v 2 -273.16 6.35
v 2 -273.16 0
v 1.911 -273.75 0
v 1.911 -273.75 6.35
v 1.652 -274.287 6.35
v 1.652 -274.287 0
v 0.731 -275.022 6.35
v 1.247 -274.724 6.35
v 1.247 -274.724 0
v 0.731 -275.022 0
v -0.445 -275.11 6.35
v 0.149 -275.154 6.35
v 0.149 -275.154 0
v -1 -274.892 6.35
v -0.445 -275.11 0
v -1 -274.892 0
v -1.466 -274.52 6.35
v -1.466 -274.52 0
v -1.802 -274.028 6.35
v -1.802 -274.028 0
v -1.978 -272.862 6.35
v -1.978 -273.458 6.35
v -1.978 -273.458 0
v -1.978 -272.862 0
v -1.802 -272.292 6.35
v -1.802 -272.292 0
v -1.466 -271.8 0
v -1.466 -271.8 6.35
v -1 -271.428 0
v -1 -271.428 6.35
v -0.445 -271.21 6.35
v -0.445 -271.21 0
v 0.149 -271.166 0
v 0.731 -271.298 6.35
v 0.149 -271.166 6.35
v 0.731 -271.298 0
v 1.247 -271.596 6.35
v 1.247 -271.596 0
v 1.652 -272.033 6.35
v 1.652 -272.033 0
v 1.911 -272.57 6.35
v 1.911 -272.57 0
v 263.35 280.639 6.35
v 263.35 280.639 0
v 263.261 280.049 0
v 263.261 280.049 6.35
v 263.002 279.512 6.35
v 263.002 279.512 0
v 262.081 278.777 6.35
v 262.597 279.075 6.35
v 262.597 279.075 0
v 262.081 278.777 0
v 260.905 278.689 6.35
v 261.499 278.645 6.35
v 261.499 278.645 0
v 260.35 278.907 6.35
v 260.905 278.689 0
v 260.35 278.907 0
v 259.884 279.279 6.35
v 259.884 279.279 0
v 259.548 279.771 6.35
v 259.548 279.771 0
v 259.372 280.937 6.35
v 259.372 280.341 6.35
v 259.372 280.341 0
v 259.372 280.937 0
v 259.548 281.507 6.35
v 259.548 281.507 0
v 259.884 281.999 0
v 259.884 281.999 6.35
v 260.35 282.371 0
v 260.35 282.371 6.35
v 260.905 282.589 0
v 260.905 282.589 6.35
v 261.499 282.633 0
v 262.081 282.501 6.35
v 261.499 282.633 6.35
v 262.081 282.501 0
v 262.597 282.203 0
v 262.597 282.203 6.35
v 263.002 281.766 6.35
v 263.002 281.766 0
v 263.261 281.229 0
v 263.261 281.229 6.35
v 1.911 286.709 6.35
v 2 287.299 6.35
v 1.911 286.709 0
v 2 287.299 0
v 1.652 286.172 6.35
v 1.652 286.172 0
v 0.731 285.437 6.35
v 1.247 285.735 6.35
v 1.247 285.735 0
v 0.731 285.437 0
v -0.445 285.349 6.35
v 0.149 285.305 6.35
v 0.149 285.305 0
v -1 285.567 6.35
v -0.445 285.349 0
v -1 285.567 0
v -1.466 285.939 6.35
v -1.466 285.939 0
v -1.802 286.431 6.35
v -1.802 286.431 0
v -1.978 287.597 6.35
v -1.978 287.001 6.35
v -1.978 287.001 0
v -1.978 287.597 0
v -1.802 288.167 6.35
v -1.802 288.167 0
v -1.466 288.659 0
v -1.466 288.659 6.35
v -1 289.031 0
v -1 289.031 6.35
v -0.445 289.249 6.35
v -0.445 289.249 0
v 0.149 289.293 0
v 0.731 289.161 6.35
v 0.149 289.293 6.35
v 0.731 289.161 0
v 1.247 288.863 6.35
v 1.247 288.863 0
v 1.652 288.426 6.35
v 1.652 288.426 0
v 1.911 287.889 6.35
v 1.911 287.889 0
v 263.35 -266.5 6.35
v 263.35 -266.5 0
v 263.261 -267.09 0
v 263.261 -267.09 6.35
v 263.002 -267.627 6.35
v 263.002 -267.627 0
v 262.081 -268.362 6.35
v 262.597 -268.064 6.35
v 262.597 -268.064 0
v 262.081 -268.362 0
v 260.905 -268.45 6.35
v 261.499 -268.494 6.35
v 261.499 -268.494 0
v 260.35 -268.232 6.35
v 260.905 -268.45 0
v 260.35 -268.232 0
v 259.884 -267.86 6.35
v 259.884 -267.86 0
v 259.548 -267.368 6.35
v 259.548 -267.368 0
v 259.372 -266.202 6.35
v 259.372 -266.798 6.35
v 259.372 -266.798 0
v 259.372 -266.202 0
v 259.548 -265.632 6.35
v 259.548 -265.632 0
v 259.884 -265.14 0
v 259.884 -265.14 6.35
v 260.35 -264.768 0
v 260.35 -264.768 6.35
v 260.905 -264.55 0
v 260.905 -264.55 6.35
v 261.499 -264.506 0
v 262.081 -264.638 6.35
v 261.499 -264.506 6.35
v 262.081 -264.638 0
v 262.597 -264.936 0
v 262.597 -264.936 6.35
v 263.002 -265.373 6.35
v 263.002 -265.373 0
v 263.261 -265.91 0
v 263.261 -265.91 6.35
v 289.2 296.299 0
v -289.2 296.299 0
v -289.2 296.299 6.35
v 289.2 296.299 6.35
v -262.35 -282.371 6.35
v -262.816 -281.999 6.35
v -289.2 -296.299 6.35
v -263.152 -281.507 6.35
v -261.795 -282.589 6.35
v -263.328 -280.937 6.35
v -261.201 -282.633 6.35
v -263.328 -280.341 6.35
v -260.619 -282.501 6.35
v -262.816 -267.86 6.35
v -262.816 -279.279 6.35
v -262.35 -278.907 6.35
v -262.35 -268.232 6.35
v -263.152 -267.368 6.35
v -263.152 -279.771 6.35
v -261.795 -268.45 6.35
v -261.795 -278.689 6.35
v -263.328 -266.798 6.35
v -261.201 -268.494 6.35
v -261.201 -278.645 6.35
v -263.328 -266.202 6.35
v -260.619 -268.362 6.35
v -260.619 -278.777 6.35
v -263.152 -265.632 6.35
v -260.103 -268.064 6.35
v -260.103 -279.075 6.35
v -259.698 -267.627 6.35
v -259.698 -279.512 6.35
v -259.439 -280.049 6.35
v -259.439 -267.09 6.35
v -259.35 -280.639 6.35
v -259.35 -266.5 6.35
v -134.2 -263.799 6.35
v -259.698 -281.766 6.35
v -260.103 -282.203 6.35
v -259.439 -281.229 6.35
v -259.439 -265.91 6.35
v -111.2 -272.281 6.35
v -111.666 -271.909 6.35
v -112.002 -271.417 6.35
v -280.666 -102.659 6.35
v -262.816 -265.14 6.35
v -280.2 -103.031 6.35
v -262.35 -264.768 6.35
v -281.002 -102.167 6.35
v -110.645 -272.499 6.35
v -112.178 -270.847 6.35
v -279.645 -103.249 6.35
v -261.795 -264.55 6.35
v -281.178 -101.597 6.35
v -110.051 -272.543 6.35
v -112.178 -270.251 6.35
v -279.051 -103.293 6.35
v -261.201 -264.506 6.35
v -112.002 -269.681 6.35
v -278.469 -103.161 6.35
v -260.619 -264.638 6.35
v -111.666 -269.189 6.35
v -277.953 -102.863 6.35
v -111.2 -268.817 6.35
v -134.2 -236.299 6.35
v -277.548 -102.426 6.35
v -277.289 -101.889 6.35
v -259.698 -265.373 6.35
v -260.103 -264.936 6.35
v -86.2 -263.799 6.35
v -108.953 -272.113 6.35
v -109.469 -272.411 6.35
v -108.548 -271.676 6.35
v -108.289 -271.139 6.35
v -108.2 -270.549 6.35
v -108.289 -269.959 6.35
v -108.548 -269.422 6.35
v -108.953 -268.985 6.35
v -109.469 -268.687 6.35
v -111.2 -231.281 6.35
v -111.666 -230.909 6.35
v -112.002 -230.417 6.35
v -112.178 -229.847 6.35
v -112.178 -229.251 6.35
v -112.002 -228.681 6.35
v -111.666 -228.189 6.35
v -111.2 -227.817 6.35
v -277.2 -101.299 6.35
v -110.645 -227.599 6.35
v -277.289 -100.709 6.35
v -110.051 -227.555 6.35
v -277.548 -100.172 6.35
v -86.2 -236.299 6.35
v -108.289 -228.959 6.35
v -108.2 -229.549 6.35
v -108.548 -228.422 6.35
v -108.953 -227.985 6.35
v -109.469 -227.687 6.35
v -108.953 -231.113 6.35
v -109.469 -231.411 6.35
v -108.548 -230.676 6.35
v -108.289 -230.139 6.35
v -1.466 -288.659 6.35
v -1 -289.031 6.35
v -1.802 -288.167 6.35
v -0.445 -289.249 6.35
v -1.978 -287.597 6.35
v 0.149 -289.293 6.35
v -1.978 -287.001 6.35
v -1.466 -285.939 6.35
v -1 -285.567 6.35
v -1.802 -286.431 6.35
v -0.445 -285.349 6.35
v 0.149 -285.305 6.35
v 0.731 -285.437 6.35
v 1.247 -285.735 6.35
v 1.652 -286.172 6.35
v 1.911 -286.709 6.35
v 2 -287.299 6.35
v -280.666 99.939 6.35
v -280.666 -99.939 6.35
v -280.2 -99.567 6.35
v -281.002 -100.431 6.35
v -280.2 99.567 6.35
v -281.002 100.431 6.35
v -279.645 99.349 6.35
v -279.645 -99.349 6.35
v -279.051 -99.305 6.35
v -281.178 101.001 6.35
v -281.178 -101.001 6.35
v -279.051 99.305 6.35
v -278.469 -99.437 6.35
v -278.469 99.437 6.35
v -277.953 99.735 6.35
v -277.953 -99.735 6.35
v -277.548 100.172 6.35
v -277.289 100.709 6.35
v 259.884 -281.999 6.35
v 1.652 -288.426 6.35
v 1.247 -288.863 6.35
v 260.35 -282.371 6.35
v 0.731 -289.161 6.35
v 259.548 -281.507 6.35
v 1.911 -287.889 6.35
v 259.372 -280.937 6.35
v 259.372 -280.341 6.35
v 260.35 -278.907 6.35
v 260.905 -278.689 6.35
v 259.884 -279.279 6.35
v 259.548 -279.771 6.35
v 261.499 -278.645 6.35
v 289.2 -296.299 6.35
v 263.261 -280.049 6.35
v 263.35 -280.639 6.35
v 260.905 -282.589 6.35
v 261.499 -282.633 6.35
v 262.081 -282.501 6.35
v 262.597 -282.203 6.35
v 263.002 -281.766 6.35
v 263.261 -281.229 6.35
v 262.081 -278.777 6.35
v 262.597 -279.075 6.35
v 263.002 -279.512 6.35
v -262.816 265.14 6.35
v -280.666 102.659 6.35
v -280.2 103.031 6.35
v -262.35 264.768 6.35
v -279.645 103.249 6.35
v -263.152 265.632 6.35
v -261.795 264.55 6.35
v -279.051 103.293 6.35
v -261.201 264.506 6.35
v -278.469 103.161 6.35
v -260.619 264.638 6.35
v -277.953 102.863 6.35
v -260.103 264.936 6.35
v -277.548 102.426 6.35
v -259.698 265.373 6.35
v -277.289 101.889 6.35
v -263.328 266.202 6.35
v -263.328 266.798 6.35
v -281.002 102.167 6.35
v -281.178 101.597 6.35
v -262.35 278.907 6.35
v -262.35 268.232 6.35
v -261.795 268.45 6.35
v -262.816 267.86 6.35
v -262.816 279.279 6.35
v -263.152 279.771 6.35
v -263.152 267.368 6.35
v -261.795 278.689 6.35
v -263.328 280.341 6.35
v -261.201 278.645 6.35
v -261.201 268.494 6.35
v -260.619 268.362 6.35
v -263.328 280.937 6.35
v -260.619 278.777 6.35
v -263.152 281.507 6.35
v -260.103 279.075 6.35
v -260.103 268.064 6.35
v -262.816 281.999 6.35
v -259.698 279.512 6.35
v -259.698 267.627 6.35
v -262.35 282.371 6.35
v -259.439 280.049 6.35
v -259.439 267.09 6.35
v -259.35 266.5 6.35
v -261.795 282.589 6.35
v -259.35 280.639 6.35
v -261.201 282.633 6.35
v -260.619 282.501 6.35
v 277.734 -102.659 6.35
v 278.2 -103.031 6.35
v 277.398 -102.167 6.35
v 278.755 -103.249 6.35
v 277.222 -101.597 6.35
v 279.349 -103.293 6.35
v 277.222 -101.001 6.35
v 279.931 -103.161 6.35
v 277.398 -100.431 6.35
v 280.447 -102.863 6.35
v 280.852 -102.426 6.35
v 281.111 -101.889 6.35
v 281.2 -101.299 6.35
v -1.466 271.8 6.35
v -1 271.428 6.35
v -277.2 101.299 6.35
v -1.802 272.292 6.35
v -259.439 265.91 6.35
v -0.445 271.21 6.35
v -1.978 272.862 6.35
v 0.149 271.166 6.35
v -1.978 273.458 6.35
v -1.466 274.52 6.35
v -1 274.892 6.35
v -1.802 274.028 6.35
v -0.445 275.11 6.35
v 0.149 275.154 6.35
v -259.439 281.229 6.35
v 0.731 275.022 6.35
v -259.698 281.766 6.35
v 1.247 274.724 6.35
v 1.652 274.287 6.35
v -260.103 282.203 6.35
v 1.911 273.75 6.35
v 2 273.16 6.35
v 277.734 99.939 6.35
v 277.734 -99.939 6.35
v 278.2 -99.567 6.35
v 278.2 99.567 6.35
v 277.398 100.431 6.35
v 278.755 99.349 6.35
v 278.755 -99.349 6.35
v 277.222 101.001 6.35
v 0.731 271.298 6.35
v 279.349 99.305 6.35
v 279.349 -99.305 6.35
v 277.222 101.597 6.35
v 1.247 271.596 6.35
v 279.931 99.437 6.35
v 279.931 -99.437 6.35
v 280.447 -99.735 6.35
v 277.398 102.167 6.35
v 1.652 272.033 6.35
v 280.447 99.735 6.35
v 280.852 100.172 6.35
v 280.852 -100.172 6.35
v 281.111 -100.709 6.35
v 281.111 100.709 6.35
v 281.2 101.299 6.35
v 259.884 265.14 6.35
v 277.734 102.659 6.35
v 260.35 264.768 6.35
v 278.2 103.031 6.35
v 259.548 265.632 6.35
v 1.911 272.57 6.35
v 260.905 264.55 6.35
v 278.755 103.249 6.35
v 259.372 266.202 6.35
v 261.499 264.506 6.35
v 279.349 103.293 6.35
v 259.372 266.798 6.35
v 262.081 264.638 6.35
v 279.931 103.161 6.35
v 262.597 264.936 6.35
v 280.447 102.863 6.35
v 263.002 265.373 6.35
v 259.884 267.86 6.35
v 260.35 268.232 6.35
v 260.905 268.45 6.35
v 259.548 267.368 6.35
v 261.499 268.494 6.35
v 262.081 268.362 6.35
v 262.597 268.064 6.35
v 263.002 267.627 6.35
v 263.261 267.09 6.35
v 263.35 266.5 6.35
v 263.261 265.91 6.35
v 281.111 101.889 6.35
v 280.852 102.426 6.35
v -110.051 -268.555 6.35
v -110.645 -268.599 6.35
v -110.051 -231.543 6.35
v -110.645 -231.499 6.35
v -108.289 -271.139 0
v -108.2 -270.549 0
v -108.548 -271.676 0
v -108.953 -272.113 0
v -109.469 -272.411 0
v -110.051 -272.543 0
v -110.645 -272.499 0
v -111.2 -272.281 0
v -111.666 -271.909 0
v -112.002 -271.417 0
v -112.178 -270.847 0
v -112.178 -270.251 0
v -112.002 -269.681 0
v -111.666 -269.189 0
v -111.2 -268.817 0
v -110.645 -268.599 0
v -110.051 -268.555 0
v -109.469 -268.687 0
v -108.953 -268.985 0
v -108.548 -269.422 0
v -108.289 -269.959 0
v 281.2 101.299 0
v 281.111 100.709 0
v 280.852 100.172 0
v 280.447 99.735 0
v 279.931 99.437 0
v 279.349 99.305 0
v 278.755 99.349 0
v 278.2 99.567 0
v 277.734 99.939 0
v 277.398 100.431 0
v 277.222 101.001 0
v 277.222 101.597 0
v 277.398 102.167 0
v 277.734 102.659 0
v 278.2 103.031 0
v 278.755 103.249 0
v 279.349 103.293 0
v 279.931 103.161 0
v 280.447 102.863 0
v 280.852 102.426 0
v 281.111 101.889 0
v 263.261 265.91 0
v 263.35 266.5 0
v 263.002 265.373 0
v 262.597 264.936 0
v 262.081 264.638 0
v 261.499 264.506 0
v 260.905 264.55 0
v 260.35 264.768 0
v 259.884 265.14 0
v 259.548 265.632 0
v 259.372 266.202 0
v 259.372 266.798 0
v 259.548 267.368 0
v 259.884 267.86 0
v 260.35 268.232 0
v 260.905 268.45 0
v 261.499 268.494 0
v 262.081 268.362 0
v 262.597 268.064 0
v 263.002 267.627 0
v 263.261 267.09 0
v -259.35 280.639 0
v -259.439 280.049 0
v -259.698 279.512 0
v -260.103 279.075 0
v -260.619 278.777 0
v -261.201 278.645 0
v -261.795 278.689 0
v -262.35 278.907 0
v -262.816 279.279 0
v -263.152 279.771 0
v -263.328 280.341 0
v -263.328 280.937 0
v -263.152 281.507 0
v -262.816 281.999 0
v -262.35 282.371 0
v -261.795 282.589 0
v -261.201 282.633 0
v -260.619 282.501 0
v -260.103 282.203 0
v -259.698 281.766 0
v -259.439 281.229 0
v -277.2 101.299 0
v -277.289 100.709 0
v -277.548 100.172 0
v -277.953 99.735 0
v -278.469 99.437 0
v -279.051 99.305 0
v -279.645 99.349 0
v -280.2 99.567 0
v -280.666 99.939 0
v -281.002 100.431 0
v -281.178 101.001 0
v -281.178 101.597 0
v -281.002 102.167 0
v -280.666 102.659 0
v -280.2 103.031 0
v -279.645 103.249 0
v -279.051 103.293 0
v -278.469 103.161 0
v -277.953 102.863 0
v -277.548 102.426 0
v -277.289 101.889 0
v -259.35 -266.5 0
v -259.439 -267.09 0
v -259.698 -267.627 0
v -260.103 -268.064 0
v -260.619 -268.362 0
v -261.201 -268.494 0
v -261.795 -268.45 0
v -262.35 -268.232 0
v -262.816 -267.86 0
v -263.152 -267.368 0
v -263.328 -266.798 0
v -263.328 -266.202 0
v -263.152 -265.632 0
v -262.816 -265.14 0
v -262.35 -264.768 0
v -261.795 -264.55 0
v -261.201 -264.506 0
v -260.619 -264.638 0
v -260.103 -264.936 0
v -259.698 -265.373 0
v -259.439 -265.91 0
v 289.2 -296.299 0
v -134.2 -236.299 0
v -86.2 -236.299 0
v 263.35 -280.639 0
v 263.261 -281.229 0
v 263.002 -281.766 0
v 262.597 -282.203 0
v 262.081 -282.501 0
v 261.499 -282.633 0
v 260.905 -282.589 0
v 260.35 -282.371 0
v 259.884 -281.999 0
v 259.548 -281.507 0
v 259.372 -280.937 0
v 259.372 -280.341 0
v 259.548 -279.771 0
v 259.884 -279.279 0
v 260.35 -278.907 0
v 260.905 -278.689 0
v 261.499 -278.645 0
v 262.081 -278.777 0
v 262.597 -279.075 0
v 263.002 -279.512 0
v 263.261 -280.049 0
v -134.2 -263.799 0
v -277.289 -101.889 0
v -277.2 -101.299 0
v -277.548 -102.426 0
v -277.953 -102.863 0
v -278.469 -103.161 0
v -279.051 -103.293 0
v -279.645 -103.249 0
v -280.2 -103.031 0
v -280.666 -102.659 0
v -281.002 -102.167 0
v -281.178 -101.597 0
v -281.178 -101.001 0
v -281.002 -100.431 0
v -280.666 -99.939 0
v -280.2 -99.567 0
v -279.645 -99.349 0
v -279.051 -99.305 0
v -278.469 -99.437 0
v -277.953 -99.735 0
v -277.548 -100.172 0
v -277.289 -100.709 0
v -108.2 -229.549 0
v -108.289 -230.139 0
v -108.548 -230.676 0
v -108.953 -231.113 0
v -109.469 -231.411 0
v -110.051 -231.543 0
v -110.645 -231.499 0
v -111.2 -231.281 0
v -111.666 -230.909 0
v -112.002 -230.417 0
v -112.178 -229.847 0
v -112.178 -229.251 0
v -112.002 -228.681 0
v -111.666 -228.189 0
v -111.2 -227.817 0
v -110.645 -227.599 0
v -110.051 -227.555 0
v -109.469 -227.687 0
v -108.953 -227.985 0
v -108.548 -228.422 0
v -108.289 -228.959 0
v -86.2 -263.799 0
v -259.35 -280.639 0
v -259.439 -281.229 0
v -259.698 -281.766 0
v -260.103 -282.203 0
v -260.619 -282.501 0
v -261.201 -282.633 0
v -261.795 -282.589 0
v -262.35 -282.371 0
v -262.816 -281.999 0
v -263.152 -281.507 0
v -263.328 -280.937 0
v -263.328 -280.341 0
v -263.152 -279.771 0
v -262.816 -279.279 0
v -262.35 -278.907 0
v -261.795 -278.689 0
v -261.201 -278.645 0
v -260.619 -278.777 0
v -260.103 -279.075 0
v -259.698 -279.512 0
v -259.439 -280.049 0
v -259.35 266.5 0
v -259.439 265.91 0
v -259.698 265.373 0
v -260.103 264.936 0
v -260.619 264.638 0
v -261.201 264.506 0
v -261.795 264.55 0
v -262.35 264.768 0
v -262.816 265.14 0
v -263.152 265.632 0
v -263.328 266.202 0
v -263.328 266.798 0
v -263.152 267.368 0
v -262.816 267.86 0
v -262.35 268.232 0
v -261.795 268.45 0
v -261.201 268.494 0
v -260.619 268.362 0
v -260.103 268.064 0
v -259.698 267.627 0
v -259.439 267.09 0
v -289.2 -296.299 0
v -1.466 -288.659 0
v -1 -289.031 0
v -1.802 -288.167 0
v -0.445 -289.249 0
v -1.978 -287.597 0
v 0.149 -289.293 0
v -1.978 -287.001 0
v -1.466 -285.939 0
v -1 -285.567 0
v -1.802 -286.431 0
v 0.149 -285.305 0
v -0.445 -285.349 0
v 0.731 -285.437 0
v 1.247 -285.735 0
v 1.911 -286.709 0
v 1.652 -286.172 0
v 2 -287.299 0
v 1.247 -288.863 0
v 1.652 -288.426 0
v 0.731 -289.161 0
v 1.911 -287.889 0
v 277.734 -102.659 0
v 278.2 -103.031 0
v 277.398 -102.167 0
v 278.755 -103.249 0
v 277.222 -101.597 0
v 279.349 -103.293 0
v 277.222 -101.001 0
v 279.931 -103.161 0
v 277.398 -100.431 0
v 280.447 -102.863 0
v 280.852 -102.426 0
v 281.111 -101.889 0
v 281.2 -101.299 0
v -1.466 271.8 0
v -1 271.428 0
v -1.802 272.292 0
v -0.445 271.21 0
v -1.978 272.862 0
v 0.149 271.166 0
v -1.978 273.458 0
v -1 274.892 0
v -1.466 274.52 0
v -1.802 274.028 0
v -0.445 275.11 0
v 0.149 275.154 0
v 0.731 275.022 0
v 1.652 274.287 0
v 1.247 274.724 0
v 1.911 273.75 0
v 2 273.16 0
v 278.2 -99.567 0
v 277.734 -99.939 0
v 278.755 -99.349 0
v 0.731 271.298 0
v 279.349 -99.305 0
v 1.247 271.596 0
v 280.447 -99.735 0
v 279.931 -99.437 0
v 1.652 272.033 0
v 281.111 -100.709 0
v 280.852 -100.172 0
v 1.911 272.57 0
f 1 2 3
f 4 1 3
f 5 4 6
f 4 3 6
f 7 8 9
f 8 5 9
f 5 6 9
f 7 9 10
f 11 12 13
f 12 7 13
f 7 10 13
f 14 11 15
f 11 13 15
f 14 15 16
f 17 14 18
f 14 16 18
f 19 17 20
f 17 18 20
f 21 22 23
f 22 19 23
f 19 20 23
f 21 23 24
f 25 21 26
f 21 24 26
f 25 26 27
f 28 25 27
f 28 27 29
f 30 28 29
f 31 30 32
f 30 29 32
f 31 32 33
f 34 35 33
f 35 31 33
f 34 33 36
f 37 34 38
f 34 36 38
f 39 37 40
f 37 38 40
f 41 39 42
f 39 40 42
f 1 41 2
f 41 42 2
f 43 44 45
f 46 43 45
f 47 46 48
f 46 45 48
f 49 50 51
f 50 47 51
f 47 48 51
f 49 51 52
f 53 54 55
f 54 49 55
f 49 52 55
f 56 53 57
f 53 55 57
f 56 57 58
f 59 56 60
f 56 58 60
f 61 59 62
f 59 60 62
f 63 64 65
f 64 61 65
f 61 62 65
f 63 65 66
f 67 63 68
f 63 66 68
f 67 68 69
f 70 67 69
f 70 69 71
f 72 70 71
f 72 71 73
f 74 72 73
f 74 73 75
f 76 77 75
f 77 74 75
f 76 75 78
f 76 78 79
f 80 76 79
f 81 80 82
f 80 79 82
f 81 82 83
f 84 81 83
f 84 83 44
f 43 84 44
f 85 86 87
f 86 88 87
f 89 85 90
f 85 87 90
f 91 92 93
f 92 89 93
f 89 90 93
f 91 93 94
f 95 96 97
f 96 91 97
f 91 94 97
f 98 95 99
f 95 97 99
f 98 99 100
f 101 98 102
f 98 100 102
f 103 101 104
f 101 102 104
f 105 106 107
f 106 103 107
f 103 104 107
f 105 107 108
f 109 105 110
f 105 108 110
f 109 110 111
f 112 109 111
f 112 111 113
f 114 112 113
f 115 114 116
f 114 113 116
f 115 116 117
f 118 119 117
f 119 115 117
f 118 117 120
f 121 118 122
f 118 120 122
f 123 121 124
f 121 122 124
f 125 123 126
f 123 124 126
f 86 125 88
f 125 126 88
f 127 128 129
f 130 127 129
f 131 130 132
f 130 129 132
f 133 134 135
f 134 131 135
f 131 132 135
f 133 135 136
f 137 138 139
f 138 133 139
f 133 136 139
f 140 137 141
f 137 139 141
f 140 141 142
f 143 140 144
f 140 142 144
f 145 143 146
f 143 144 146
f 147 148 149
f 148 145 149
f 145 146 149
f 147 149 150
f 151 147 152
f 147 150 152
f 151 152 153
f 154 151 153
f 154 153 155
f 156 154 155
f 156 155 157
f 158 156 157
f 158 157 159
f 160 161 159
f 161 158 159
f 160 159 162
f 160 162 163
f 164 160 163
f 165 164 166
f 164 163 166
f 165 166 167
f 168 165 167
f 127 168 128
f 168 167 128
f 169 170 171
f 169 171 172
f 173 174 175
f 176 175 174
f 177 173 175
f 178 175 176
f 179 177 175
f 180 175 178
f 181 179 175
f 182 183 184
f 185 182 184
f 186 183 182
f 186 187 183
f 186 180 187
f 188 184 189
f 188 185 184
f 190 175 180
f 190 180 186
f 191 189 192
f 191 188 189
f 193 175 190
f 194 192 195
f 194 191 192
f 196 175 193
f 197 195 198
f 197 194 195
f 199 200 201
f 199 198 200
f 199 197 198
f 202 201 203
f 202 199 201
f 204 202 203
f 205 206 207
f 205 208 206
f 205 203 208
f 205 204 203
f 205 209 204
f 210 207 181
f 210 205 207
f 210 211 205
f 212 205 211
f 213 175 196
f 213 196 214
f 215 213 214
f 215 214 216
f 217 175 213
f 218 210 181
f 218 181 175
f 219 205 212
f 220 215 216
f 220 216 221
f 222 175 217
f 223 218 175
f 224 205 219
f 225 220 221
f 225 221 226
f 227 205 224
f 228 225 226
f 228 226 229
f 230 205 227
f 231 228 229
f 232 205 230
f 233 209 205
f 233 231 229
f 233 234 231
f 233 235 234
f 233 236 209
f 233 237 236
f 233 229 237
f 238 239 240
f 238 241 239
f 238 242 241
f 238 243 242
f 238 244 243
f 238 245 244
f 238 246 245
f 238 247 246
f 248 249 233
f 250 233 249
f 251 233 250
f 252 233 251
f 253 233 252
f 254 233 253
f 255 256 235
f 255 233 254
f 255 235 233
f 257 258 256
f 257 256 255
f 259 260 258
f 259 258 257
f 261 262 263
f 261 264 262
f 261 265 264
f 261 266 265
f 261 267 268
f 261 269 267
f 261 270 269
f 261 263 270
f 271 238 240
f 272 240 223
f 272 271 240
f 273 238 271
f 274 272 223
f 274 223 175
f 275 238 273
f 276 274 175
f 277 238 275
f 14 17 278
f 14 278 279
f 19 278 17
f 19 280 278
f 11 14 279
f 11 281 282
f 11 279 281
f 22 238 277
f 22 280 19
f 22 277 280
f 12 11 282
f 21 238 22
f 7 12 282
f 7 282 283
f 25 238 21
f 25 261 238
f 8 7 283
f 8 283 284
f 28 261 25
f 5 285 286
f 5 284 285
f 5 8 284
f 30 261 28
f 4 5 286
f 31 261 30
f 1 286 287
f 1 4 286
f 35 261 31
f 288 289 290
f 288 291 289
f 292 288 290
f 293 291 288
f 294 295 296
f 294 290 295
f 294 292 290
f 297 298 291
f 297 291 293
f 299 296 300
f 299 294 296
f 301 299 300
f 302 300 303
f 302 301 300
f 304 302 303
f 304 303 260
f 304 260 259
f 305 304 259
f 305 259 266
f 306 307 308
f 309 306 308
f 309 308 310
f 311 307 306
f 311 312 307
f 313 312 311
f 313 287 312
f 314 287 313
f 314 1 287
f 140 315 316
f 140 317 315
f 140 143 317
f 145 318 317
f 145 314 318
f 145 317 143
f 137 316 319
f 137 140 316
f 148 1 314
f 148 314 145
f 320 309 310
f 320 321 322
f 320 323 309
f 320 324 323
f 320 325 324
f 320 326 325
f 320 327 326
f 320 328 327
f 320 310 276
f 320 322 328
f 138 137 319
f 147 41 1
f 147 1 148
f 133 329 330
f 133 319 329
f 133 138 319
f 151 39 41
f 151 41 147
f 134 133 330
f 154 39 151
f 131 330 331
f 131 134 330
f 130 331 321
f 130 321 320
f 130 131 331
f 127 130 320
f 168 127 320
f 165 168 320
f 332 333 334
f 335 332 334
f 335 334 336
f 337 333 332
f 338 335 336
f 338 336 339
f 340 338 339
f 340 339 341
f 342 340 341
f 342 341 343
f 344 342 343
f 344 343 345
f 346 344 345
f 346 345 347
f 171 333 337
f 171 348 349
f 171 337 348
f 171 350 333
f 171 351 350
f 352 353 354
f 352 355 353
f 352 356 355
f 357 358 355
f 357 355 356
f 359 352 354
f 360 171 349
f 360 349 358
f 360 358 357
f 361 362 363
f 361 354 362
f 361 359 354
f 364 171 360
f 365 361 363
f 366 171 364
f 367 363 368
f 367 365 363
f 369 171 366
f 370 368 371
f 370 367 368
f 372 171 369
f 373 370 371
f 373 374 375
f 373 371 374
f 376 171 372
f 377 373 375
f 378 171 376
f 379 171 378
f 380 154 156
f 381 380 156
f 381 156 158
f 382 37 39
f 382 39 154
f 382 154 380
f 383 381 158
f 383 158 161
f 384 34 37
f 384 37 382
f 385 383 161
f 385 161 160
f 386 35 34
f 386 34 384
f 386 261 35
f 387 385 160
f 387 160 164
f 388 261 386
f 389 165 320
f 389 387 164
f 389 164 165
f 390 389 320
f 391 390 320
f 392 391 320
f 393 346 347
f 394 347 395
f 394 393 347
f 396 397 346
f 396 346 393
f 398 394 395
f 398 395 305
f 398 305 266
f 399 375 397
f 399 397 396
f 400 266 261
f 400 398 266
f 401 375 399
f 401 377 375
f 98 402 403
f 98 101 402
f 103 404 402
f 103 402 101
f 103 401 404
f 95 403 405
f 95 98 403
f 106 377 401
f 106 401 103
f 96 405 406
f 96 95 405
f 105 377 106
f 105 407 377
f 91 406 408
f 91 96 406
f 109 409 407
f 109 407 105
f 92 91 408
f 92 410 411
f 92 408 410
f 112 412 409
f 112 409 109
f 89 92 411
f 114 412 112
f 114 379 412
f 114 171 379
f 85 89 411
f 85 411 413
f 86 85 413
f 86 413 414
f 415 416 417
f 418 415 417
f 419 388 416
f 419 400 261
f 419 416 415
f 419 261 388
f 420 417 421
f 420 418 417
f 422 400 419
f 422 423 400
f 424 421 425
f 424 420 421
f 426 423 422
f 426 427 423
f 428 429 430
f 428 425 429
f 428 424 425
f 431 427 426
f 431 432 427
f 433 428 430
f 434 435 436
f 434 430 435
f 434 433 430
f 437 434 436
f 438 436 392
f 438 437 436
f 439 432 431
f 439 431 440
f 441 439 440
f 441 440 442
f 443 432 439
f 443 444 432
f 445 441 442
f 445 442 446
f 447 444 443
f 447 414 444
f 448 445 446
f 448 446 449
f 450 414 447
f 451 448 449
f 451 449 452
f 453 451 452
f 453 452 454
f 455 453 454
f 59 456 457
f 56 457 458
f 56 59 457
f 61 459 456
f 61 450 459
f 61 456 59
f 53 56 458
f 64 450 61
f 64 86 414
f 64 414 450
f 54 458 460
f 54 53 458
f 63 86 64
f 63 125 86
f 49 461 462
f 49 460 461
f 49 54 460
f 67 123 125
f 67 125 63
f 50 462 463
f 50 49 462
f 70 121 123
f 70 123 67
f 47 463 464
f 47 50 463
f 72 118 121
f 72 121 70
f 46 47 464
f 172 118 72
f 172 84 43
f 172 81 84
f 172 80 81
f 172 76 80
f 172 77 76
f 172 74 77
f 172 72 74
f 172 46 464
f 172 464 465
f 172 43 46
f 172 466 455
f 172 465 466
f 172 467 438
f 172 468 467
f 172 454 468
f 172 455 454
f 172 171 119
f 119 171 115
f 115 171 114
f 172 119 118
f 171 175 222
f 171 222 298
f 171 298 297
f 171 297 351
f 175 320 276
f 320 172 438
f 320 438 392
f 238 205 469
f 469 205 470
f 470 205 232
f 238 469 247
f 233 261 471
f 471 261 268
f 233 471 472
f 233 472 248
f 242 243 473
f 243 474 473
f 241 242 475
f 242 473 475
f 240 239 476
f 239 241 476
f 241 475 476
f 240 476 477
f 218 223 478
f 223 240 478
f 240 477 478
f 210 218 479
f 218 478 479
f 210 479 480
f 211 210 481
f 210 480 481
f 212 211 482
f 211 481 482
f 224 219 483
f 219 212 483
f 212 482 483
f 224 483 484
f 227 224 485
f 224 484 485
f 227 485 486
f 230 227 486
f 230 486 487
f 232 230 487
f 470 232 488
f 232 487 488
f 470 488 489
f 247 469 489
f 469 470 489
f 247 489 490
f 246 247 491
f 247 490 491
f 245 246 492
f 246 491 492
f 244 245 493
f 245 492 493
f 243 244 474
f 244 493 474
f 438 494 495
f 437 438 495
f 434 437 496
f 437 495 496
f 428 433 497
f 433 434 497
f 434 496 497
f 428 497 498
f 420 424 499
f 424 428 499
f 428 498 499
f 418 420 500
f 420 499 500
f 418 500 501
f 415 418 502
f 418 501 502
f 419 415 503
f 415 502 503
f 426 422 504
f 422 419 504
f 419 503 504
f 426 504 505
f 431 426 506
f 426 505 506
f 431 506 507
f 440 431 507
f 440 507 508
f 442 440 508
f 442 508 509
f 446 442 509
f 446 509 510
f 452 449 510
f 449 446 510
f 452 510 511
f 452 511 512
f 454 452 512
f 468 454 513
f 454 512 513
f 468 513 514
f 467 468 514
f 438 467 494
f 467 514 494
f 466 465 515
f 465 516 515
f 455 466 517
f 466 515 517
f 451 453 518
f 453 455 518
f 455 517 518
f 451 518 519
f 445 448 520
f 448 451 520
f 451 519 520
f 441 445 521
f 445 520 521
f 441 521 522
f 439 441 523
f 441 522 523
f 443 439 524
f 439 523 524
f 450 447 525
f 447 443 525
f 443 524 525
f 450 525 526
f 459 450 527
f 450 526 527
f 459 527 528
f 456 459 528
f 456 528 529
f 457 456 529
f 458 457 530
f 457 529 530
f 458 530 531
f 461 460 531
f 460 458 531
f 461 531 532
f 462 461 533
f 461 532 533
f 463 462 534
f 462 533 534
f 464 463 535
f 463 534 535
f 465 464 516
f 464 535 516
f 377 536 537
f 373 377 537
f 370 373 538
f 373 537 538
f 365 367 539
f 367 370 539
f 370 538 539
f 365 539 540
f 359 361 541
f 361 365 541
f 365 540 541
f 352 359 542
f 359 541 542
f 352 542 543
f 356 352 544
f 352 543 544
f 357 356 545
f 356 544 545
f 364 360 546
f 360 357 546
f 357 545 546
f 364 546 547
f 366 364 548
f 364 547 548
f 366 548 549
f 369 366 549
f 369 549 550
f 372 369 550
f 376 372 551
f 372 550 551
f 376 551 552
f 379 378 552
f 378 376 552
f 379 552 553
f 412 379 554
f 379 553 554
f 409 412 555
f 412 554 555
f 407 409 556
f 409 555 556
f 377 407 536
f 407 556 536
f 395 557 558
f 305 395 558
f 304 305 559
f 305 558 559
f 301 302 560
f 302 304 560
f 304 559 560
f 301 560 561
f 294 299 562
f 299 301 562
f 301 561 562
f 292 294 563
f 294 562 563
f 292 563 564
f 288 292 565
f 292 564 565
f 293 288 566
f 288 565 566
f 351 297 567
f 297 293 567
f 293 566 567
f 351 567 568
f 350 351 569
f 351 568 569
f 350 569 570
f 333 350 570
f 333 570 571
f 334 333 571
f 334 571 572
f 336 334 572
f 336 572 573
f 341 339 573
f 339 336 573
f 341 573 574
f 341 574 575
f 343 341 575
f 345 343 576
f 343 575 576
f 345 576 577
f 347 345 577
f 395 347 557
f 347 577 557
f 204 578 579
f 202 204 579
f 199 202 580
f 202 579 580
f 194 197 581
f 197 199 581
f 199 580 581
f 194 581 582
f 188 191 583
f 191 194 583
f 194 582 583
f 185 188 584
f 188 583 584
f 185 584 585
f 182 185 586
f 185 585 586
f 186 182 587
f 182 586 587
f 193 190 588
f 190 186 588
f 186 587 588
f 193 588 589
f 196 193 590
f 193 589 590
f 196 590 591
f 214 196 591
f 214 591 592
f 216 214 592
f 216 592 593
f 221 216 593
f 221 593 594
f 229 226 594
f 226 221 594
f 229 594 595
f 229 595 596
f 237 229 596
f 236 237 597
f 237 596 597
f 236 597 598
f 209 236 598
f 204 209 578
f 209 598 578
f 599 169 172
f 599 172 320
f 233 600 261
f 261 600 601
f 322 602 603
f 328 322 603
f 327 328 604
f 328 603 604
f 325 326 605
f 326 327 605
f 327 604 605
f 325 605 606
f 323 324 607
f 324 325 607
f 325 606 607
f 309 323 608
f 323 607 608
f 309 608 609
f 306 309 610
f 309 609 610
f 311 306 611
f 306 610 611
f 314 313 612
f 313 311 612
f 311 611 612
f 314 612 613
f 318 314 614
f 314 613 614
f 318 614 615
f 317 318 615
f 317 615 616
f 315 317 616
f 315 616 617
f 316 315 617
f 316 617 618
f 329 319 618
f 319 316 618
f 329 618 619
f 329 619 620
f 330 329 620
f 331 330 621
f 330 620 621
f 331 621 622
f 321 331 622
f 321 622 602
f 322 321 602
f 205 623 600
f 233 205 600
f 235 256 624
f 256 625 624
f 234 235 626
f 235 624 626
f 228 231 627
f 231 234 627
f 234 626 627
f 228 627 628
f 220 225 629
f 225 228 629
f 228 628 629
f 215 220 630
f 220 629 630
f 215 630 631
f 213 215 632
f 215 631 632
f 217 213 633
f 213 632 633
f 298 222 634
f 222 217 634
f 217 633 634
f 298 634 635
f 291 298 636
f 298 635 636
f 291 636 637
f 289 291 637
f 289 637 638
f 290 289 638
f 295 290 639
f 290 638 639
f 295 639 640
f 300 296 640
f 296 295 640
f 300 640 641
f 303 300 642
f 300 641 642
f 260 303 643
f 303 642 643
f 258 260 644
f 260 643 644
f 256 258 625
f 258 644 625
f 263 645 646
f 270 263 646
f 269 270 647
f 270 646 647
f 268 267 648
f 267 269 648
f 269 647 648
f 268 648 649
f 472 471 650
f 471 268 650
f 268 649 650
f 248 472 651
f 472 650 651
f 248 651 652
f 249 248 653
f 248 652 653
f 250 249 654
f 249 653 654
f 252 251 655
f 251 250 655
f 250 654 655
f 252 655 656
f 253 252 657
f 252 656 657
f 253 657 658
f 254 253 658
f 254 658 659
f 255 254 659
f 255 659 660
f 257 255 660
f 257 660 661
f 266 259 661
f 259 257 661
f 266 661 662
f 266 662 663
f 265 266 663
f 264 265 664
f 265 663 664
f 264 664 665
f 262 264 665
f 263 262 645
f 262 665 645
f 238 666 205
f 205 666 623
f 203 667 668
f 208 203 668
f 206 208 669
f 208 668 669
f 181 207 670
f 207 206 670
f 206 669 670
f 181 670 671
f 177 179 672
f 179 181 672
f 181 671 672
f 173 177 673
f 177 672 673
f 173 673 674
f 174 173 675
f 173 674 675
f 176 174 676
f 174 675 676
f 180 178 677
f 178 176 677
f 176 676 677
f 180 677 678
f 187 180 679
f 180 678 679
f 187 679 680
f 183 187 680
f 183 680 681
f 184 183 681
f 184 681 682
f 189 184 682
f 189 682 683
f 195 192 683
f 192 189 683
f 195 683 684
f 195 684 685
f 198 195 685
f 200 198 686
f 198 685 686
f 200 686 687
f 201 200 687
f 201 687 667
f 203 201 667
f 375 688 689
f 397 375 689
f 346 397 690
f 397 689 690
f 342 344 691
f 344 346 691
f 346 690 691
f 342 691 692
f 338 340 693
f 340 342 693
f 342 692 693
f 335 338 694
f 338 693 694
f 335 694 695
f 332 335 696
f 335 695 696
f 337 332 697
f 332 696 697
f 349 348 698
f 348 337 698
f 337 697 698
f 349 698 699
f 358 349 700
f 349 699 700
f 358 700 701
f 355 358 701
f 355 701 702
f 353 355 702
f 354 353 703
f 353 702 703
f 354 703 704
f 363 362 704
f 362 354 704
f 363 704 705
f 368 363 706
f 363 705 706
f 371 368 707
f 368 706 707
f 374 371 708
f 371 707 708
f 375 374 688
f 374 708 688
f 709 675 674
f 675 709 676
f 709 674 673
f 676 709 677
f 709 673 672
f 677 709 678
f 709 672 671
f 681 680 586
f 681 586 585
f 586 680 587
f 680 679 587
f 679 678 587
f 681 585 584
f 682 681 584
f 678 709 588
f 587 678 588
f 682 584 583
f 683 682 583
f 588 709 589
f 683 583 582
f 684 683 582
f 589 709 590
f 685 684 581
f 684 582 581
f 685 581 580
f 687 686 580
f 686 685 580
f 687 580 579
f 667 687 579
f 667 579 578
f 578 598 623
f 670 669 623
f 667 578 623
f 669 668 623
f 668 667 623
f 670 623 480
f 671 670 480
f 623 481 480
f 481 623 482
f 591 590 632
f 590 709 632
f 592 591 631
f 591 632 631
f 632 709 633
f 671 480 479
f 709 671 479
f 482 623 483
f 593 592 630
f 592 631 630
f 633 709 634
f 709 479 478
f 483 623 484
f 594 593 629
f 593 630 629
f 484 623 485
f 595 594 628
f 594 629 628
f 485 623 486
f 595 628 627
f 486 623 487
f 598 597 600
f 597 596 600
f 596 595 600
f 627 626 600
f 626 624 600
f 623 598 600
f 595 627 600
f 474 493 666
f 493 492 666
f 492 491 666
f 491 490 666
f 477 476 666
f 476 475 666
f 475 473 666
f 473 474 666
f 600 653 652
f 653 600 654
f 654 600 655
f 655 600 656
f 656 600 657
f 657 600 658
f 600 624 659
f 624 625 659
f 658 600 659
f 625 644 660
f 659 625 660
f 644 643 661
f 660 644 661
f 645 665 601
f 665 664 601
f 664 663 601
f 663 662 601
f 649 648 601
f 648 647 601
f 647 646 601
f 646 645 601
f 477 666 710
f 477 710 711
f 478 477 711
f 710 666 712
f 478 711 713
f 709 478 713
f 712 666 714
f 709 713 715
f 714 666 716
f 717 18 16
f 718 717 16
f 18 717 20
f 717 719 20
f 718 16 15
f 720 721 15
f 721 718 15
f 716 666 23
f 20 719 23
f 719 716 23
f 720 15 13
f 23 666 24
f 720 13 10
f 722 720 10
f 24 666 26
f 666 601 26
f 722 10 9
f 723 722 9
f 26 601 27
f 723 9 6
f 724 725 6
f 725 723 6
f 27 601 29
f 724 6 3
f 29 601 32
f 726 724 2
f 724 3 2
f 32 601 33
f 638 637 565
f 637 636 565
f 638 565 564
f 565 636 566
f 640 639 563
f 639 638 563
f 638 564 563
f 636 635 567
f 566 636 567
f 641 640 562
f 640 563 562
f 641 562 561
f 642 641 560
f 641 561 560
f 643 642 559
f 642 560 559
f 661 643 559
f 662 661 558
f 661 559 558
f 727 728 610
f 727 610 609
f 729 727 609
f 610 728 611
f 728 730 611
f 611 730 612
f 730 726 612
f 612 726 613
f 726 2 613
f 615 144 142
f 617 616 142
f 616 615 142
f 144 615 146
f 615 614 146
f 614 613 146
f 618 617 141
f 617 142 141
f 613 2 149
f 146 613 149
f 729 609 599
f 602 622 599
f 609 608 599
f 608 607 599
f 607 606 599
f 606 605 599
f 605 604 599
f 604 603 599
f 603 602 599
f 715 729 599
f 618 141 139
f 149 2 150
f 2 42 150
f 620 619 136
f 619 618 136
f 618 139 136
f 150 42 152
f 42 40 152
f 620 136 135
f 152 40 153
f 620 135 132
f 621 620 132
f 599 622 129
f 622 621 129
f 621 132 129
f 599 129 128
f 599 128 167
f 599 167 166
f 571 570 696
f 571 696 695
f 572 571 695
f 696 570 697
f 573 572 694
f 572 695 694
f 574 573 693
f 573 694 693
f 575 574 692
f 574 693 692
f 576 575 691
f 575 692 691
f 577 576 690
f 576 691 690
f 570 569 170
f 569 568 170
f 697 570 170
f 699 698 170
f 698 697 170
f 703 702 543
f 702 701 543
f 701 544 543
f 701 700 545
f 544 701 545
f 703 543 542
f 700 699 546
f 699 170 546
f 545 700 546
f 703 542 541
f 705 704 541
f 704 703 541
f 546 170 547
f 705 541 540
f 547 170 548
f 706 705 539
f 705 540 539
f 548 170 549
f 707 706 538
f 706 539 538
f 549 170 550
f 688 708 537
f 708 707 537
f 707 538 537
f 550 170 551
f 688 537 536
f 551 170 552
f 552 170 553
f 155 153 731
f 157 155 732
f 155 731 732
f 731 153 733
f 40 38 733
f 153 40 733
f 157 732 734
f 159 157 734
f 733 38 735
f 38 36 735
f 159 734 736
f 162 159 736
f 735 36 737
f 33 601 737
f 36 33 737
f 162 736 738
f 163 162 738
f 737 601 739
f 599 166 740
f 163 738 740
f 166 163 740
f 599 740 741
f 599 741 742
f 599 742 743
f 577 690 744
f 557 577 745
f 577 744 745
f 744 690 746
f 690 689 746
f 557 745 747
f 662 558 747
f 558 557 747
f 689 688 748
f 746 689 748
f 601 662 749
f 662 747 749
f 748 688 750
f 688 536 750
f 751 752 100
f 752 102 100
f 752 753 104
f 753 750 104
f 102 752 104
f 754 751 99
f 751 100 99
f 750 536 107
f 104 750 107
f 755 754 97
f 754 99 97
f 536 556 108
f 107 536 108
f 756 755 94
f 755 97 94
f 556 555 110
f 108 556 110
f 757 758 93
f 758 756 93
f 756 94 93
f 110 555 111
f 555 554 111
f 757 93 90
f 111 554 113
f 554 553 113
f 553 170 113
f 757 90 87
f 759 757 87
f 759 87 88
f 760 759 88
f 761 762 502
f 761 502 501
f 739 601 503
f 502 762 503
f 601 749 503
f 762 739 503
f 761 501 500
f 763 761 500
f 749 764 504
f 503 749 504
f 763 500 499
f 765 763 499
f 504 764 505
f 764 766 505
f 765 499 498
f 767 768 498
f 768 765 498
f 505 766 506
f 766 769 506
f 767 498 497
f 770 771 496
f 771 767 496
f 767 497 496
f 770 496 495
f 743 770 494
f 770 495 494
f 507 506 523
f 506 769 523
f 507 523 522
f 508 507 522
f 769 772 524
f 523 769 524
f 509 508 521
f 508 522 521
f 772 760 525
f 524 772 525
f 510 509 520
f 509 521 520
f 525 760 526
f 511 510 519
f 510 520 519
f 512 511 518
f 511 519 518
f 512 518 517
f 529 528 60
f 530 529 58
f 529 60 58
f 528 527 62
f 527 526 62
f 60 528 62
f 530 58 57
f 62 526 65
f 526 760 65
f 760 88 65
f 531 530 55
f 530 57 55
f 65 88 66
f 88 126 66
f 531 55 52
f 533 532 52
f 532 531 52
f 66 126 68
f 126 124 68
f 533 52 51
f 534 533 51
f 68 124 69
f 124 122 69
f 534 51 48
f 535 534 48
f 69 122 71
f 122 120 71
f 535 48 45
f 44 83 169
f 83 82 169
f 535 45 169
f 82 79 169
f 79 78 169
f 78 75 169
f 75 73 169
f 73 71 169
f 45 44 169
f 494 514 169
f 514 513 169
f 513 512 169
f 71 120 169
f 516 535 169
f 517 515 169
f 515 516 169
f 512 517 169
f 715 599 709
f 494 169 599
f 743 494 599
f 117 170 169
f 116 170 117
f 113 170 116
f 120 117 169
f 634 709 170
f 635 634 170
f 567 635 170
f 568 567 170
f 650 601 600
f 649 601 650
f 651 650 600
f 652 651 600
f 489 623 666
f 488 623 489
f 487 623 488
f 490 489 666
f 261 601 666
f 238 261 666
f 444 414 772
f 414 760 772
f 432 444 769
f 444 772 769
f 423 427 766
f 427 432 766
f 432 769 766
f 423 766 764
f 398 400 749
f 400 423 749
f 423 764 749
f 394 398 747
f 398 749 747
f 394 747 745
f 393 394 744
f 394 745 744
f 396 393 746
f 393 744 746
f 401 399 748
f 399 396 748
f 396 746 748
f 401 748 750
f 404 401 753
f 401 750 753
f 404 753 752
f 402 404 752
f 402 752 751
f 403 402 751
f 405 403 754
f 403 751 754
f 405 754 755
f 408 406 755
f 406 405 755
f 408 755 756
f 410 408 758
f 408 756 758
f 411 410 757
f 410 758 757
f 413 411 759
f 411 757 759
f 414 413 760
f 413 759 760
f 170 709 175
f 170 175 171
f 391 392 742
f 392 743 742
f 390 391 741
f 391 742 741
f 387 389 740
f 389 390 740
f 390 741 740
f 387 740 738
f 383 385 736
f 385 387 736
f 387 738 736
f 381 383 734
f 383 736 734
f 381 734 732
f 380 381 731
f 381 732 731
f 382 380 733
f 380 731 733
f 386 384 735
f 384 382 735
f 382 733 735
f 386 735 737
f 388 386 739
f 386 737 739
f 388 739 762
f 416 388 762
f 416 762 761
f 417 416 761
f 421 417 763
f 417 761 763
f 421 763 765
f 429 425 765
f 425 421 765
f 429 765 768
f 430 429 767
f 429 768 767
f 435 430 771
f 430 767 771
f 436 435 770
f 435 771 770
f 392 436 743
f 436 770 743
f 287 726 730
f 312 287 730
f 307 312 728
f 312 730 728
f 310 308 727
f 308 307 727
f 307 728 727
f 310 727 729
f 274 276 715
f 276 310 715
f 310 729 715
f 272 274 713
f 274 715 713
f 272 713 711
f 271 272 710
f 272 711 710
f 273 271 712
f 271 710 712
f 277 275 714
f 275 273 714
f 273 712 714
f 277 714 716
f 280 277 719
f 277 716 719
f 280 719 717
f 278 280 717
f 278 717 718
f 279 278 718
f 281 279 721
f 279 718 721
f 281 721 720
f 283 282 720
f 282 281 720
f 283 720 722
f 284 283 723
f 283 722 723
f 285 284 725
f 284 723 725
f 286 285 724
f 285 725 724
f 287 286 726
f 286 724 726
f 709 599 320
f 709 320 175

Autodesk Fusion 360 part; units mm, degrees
sketch "Sketch1" plane through (0, 0, 0) normal (0, 0, 1) x (1, 0, 0)
  line L0 (284.2, -291.299) -> (-284.2, -291.299)
  line L1 (-284.2, -291.299) -> (-284.2, 291.299)
  line L2 (-284.2, 291.299) -> (284.2, 291.299)
  line L3 (284.2, 291.299) -> (284.2, -291.299)
  line L4 (284.2, -291.299) -> (-284.2, 291.299) construction
  line L5 (-284.2, -291.299) -> (284.2, 291.299) construction
  line L6 (-261.35, 291.299) -> (-261.35, -291.299) construction
  circle A0 centre (-261.35, 280.639) radius 2
  circle A1 centre (-261.35, 266.5) radius 2
  circle A2 centre (-261.35, -280.639) radius 2
  circle A3 centre (-261.35, -266.5) radius 2
  line L7 (261.35, 291.299) -> (261.35, -291.299) construction
  circle A4 centre (261.35, 280.639) radius 2
  circle A5 centre (261.35, 266.5) radius 2
  circle A6 centre (261.35, -280.639) radius 2
  circle A7 centre (261.35, -266.5) radius 2
  line L8 (-261.35, -266.5) -> (261.35, -266.5) construction
  circle A8 centre (0, -273.16) radius 2
  line L9 (0, -291.299) -> (0, 291.299) construction
  circle A9 centre (0, 273.16) radius 2
  circle A10 centre (0, 287.299) radius 2
  circle A11 centre (0, -287.299) radius 2
  line L10 (-289.2, 296.299) -> (289.2, 296.299)
  line L11 (289.2, 296.299) -> (289.2, -296.299)
  line L12 (289.2, -296.299) -> (-289.2, -296.299)
  line L13 (-289.2, -296.299) -> (-289.2, 296.299)
  line L14 (-289.2, -101.299) -> (289.2, -101.299) construction
  line L15 (-289.2, 101.299) -> (289.2, 101.299) construction
  circle A12 centre (-279.2, 101.299) radius 2
  circle A13 centre (-279.2, -101.299) radius 2
  circle A14 centre (279.2, -101.299) radius 2
  circle A15 centre (279.2, 101.299) radius 2
  line L16 (-134.2, -236.299) -> (-86.2, -236.299)
  line L17 (-86.2, -236.299) -> (-86.2, -263.799)
  line L18 (-86.2, -263.799) -> (-134.2, -263.799)
  line L19 (-134.2, -263.799) -> (-134.2, -236.299)
  line L20 (-110.2, -221.3553) -> (-110.2, -265.3735) construction
  circle A16 centre (-110.2, -270.549) radius 2
  circle A17 centre (-110.2, -229.549) radius 2
  line L21 (-261.35, 266.5) -> (261.35, 266.5) construction
  line L22 (-261.35, -280.639) -> (261.35, -280.639) construction
  line L23 (261.35, 280.639) -> (-261.35, 280.639) construction
  dimension "d1" = 568.4
  dimension "d2" = 582.598
  dimension "d3" = 22.85
  dimension "d4" = 4
  dimension "d6" = 4
  dimension "d8" = 4
  dimension "d9" = 4
  dimension "d12" = 22.85
  dimension "d13" = 4
  dimension "d14" = 4
  dimension "d17" = 4
  dimension "d18" = 4
  dimension "d21" = 4
  dimension "d22" = 4
  dimension "d23" = 4
  dimension "d24" = 4
  dimension "d30" = 5
  dimension "d31" = 5
  dimension "d32" = 5
  dimension "d33" = 5
  dimension "d34" = 190
  dimension "d35" = 190
  dimension "d36" = 4
  dimension "d37" = 5
  dimension "d38" = 4
  dimension "d39" = 5
  dimension "d40" = 4
  dimension "d41" = 5
  dimension "d42" = 4
  dimension "d43" = 5
  dimension "d44" = 48
  dimension "d45" = 27.5
  dimension "d46" = 55
  dimension "d47" = 150
  dimension "d48" = 24
  dimension "d49" = 4
  dimension "d50" = 4
  dimension "d51" = 41
  dimension "d52" = 20.5
  dimension "d53" = 24.799
  dimension "d54" = 24.799
  dimension "d55" = 10.66
  dimension "d56" = 10.66
  dimension "d60" = 14.139
  dimension "d61" = 4
  dimension "d62" = 14.139
  dimension "d63" = 4
extrude "Extrude1" add sketch "Sketch1" along normal blind 6.35 contours L0 L1 L2 L3 | L10 L11 L12 L13 makes body 1
copy_body "Body->Comp1" bodies 1 removing the originals makes body 2 in component "back"
component "back" placed x (1, 0, 0) y (0, 1, 0) z (0, 0, 1) at (0, 0, 0)
equation "d1 = XRailLength + 218.4 mm"
equation "d2 = PrintHeight + 282.598 mm"
equation "d28 = ( 25.4 / 4 ) * 1 mm"
equation "d30 = WallThickness"
equation "d31 = WallThickness"
equation "d32 = WallThickness"
equation "d33 = WallThickness"
equation "WallThickness = 5 mm"
equation "XRailLength = 350 mm"
equation "PrintHeight = 300 mm"
